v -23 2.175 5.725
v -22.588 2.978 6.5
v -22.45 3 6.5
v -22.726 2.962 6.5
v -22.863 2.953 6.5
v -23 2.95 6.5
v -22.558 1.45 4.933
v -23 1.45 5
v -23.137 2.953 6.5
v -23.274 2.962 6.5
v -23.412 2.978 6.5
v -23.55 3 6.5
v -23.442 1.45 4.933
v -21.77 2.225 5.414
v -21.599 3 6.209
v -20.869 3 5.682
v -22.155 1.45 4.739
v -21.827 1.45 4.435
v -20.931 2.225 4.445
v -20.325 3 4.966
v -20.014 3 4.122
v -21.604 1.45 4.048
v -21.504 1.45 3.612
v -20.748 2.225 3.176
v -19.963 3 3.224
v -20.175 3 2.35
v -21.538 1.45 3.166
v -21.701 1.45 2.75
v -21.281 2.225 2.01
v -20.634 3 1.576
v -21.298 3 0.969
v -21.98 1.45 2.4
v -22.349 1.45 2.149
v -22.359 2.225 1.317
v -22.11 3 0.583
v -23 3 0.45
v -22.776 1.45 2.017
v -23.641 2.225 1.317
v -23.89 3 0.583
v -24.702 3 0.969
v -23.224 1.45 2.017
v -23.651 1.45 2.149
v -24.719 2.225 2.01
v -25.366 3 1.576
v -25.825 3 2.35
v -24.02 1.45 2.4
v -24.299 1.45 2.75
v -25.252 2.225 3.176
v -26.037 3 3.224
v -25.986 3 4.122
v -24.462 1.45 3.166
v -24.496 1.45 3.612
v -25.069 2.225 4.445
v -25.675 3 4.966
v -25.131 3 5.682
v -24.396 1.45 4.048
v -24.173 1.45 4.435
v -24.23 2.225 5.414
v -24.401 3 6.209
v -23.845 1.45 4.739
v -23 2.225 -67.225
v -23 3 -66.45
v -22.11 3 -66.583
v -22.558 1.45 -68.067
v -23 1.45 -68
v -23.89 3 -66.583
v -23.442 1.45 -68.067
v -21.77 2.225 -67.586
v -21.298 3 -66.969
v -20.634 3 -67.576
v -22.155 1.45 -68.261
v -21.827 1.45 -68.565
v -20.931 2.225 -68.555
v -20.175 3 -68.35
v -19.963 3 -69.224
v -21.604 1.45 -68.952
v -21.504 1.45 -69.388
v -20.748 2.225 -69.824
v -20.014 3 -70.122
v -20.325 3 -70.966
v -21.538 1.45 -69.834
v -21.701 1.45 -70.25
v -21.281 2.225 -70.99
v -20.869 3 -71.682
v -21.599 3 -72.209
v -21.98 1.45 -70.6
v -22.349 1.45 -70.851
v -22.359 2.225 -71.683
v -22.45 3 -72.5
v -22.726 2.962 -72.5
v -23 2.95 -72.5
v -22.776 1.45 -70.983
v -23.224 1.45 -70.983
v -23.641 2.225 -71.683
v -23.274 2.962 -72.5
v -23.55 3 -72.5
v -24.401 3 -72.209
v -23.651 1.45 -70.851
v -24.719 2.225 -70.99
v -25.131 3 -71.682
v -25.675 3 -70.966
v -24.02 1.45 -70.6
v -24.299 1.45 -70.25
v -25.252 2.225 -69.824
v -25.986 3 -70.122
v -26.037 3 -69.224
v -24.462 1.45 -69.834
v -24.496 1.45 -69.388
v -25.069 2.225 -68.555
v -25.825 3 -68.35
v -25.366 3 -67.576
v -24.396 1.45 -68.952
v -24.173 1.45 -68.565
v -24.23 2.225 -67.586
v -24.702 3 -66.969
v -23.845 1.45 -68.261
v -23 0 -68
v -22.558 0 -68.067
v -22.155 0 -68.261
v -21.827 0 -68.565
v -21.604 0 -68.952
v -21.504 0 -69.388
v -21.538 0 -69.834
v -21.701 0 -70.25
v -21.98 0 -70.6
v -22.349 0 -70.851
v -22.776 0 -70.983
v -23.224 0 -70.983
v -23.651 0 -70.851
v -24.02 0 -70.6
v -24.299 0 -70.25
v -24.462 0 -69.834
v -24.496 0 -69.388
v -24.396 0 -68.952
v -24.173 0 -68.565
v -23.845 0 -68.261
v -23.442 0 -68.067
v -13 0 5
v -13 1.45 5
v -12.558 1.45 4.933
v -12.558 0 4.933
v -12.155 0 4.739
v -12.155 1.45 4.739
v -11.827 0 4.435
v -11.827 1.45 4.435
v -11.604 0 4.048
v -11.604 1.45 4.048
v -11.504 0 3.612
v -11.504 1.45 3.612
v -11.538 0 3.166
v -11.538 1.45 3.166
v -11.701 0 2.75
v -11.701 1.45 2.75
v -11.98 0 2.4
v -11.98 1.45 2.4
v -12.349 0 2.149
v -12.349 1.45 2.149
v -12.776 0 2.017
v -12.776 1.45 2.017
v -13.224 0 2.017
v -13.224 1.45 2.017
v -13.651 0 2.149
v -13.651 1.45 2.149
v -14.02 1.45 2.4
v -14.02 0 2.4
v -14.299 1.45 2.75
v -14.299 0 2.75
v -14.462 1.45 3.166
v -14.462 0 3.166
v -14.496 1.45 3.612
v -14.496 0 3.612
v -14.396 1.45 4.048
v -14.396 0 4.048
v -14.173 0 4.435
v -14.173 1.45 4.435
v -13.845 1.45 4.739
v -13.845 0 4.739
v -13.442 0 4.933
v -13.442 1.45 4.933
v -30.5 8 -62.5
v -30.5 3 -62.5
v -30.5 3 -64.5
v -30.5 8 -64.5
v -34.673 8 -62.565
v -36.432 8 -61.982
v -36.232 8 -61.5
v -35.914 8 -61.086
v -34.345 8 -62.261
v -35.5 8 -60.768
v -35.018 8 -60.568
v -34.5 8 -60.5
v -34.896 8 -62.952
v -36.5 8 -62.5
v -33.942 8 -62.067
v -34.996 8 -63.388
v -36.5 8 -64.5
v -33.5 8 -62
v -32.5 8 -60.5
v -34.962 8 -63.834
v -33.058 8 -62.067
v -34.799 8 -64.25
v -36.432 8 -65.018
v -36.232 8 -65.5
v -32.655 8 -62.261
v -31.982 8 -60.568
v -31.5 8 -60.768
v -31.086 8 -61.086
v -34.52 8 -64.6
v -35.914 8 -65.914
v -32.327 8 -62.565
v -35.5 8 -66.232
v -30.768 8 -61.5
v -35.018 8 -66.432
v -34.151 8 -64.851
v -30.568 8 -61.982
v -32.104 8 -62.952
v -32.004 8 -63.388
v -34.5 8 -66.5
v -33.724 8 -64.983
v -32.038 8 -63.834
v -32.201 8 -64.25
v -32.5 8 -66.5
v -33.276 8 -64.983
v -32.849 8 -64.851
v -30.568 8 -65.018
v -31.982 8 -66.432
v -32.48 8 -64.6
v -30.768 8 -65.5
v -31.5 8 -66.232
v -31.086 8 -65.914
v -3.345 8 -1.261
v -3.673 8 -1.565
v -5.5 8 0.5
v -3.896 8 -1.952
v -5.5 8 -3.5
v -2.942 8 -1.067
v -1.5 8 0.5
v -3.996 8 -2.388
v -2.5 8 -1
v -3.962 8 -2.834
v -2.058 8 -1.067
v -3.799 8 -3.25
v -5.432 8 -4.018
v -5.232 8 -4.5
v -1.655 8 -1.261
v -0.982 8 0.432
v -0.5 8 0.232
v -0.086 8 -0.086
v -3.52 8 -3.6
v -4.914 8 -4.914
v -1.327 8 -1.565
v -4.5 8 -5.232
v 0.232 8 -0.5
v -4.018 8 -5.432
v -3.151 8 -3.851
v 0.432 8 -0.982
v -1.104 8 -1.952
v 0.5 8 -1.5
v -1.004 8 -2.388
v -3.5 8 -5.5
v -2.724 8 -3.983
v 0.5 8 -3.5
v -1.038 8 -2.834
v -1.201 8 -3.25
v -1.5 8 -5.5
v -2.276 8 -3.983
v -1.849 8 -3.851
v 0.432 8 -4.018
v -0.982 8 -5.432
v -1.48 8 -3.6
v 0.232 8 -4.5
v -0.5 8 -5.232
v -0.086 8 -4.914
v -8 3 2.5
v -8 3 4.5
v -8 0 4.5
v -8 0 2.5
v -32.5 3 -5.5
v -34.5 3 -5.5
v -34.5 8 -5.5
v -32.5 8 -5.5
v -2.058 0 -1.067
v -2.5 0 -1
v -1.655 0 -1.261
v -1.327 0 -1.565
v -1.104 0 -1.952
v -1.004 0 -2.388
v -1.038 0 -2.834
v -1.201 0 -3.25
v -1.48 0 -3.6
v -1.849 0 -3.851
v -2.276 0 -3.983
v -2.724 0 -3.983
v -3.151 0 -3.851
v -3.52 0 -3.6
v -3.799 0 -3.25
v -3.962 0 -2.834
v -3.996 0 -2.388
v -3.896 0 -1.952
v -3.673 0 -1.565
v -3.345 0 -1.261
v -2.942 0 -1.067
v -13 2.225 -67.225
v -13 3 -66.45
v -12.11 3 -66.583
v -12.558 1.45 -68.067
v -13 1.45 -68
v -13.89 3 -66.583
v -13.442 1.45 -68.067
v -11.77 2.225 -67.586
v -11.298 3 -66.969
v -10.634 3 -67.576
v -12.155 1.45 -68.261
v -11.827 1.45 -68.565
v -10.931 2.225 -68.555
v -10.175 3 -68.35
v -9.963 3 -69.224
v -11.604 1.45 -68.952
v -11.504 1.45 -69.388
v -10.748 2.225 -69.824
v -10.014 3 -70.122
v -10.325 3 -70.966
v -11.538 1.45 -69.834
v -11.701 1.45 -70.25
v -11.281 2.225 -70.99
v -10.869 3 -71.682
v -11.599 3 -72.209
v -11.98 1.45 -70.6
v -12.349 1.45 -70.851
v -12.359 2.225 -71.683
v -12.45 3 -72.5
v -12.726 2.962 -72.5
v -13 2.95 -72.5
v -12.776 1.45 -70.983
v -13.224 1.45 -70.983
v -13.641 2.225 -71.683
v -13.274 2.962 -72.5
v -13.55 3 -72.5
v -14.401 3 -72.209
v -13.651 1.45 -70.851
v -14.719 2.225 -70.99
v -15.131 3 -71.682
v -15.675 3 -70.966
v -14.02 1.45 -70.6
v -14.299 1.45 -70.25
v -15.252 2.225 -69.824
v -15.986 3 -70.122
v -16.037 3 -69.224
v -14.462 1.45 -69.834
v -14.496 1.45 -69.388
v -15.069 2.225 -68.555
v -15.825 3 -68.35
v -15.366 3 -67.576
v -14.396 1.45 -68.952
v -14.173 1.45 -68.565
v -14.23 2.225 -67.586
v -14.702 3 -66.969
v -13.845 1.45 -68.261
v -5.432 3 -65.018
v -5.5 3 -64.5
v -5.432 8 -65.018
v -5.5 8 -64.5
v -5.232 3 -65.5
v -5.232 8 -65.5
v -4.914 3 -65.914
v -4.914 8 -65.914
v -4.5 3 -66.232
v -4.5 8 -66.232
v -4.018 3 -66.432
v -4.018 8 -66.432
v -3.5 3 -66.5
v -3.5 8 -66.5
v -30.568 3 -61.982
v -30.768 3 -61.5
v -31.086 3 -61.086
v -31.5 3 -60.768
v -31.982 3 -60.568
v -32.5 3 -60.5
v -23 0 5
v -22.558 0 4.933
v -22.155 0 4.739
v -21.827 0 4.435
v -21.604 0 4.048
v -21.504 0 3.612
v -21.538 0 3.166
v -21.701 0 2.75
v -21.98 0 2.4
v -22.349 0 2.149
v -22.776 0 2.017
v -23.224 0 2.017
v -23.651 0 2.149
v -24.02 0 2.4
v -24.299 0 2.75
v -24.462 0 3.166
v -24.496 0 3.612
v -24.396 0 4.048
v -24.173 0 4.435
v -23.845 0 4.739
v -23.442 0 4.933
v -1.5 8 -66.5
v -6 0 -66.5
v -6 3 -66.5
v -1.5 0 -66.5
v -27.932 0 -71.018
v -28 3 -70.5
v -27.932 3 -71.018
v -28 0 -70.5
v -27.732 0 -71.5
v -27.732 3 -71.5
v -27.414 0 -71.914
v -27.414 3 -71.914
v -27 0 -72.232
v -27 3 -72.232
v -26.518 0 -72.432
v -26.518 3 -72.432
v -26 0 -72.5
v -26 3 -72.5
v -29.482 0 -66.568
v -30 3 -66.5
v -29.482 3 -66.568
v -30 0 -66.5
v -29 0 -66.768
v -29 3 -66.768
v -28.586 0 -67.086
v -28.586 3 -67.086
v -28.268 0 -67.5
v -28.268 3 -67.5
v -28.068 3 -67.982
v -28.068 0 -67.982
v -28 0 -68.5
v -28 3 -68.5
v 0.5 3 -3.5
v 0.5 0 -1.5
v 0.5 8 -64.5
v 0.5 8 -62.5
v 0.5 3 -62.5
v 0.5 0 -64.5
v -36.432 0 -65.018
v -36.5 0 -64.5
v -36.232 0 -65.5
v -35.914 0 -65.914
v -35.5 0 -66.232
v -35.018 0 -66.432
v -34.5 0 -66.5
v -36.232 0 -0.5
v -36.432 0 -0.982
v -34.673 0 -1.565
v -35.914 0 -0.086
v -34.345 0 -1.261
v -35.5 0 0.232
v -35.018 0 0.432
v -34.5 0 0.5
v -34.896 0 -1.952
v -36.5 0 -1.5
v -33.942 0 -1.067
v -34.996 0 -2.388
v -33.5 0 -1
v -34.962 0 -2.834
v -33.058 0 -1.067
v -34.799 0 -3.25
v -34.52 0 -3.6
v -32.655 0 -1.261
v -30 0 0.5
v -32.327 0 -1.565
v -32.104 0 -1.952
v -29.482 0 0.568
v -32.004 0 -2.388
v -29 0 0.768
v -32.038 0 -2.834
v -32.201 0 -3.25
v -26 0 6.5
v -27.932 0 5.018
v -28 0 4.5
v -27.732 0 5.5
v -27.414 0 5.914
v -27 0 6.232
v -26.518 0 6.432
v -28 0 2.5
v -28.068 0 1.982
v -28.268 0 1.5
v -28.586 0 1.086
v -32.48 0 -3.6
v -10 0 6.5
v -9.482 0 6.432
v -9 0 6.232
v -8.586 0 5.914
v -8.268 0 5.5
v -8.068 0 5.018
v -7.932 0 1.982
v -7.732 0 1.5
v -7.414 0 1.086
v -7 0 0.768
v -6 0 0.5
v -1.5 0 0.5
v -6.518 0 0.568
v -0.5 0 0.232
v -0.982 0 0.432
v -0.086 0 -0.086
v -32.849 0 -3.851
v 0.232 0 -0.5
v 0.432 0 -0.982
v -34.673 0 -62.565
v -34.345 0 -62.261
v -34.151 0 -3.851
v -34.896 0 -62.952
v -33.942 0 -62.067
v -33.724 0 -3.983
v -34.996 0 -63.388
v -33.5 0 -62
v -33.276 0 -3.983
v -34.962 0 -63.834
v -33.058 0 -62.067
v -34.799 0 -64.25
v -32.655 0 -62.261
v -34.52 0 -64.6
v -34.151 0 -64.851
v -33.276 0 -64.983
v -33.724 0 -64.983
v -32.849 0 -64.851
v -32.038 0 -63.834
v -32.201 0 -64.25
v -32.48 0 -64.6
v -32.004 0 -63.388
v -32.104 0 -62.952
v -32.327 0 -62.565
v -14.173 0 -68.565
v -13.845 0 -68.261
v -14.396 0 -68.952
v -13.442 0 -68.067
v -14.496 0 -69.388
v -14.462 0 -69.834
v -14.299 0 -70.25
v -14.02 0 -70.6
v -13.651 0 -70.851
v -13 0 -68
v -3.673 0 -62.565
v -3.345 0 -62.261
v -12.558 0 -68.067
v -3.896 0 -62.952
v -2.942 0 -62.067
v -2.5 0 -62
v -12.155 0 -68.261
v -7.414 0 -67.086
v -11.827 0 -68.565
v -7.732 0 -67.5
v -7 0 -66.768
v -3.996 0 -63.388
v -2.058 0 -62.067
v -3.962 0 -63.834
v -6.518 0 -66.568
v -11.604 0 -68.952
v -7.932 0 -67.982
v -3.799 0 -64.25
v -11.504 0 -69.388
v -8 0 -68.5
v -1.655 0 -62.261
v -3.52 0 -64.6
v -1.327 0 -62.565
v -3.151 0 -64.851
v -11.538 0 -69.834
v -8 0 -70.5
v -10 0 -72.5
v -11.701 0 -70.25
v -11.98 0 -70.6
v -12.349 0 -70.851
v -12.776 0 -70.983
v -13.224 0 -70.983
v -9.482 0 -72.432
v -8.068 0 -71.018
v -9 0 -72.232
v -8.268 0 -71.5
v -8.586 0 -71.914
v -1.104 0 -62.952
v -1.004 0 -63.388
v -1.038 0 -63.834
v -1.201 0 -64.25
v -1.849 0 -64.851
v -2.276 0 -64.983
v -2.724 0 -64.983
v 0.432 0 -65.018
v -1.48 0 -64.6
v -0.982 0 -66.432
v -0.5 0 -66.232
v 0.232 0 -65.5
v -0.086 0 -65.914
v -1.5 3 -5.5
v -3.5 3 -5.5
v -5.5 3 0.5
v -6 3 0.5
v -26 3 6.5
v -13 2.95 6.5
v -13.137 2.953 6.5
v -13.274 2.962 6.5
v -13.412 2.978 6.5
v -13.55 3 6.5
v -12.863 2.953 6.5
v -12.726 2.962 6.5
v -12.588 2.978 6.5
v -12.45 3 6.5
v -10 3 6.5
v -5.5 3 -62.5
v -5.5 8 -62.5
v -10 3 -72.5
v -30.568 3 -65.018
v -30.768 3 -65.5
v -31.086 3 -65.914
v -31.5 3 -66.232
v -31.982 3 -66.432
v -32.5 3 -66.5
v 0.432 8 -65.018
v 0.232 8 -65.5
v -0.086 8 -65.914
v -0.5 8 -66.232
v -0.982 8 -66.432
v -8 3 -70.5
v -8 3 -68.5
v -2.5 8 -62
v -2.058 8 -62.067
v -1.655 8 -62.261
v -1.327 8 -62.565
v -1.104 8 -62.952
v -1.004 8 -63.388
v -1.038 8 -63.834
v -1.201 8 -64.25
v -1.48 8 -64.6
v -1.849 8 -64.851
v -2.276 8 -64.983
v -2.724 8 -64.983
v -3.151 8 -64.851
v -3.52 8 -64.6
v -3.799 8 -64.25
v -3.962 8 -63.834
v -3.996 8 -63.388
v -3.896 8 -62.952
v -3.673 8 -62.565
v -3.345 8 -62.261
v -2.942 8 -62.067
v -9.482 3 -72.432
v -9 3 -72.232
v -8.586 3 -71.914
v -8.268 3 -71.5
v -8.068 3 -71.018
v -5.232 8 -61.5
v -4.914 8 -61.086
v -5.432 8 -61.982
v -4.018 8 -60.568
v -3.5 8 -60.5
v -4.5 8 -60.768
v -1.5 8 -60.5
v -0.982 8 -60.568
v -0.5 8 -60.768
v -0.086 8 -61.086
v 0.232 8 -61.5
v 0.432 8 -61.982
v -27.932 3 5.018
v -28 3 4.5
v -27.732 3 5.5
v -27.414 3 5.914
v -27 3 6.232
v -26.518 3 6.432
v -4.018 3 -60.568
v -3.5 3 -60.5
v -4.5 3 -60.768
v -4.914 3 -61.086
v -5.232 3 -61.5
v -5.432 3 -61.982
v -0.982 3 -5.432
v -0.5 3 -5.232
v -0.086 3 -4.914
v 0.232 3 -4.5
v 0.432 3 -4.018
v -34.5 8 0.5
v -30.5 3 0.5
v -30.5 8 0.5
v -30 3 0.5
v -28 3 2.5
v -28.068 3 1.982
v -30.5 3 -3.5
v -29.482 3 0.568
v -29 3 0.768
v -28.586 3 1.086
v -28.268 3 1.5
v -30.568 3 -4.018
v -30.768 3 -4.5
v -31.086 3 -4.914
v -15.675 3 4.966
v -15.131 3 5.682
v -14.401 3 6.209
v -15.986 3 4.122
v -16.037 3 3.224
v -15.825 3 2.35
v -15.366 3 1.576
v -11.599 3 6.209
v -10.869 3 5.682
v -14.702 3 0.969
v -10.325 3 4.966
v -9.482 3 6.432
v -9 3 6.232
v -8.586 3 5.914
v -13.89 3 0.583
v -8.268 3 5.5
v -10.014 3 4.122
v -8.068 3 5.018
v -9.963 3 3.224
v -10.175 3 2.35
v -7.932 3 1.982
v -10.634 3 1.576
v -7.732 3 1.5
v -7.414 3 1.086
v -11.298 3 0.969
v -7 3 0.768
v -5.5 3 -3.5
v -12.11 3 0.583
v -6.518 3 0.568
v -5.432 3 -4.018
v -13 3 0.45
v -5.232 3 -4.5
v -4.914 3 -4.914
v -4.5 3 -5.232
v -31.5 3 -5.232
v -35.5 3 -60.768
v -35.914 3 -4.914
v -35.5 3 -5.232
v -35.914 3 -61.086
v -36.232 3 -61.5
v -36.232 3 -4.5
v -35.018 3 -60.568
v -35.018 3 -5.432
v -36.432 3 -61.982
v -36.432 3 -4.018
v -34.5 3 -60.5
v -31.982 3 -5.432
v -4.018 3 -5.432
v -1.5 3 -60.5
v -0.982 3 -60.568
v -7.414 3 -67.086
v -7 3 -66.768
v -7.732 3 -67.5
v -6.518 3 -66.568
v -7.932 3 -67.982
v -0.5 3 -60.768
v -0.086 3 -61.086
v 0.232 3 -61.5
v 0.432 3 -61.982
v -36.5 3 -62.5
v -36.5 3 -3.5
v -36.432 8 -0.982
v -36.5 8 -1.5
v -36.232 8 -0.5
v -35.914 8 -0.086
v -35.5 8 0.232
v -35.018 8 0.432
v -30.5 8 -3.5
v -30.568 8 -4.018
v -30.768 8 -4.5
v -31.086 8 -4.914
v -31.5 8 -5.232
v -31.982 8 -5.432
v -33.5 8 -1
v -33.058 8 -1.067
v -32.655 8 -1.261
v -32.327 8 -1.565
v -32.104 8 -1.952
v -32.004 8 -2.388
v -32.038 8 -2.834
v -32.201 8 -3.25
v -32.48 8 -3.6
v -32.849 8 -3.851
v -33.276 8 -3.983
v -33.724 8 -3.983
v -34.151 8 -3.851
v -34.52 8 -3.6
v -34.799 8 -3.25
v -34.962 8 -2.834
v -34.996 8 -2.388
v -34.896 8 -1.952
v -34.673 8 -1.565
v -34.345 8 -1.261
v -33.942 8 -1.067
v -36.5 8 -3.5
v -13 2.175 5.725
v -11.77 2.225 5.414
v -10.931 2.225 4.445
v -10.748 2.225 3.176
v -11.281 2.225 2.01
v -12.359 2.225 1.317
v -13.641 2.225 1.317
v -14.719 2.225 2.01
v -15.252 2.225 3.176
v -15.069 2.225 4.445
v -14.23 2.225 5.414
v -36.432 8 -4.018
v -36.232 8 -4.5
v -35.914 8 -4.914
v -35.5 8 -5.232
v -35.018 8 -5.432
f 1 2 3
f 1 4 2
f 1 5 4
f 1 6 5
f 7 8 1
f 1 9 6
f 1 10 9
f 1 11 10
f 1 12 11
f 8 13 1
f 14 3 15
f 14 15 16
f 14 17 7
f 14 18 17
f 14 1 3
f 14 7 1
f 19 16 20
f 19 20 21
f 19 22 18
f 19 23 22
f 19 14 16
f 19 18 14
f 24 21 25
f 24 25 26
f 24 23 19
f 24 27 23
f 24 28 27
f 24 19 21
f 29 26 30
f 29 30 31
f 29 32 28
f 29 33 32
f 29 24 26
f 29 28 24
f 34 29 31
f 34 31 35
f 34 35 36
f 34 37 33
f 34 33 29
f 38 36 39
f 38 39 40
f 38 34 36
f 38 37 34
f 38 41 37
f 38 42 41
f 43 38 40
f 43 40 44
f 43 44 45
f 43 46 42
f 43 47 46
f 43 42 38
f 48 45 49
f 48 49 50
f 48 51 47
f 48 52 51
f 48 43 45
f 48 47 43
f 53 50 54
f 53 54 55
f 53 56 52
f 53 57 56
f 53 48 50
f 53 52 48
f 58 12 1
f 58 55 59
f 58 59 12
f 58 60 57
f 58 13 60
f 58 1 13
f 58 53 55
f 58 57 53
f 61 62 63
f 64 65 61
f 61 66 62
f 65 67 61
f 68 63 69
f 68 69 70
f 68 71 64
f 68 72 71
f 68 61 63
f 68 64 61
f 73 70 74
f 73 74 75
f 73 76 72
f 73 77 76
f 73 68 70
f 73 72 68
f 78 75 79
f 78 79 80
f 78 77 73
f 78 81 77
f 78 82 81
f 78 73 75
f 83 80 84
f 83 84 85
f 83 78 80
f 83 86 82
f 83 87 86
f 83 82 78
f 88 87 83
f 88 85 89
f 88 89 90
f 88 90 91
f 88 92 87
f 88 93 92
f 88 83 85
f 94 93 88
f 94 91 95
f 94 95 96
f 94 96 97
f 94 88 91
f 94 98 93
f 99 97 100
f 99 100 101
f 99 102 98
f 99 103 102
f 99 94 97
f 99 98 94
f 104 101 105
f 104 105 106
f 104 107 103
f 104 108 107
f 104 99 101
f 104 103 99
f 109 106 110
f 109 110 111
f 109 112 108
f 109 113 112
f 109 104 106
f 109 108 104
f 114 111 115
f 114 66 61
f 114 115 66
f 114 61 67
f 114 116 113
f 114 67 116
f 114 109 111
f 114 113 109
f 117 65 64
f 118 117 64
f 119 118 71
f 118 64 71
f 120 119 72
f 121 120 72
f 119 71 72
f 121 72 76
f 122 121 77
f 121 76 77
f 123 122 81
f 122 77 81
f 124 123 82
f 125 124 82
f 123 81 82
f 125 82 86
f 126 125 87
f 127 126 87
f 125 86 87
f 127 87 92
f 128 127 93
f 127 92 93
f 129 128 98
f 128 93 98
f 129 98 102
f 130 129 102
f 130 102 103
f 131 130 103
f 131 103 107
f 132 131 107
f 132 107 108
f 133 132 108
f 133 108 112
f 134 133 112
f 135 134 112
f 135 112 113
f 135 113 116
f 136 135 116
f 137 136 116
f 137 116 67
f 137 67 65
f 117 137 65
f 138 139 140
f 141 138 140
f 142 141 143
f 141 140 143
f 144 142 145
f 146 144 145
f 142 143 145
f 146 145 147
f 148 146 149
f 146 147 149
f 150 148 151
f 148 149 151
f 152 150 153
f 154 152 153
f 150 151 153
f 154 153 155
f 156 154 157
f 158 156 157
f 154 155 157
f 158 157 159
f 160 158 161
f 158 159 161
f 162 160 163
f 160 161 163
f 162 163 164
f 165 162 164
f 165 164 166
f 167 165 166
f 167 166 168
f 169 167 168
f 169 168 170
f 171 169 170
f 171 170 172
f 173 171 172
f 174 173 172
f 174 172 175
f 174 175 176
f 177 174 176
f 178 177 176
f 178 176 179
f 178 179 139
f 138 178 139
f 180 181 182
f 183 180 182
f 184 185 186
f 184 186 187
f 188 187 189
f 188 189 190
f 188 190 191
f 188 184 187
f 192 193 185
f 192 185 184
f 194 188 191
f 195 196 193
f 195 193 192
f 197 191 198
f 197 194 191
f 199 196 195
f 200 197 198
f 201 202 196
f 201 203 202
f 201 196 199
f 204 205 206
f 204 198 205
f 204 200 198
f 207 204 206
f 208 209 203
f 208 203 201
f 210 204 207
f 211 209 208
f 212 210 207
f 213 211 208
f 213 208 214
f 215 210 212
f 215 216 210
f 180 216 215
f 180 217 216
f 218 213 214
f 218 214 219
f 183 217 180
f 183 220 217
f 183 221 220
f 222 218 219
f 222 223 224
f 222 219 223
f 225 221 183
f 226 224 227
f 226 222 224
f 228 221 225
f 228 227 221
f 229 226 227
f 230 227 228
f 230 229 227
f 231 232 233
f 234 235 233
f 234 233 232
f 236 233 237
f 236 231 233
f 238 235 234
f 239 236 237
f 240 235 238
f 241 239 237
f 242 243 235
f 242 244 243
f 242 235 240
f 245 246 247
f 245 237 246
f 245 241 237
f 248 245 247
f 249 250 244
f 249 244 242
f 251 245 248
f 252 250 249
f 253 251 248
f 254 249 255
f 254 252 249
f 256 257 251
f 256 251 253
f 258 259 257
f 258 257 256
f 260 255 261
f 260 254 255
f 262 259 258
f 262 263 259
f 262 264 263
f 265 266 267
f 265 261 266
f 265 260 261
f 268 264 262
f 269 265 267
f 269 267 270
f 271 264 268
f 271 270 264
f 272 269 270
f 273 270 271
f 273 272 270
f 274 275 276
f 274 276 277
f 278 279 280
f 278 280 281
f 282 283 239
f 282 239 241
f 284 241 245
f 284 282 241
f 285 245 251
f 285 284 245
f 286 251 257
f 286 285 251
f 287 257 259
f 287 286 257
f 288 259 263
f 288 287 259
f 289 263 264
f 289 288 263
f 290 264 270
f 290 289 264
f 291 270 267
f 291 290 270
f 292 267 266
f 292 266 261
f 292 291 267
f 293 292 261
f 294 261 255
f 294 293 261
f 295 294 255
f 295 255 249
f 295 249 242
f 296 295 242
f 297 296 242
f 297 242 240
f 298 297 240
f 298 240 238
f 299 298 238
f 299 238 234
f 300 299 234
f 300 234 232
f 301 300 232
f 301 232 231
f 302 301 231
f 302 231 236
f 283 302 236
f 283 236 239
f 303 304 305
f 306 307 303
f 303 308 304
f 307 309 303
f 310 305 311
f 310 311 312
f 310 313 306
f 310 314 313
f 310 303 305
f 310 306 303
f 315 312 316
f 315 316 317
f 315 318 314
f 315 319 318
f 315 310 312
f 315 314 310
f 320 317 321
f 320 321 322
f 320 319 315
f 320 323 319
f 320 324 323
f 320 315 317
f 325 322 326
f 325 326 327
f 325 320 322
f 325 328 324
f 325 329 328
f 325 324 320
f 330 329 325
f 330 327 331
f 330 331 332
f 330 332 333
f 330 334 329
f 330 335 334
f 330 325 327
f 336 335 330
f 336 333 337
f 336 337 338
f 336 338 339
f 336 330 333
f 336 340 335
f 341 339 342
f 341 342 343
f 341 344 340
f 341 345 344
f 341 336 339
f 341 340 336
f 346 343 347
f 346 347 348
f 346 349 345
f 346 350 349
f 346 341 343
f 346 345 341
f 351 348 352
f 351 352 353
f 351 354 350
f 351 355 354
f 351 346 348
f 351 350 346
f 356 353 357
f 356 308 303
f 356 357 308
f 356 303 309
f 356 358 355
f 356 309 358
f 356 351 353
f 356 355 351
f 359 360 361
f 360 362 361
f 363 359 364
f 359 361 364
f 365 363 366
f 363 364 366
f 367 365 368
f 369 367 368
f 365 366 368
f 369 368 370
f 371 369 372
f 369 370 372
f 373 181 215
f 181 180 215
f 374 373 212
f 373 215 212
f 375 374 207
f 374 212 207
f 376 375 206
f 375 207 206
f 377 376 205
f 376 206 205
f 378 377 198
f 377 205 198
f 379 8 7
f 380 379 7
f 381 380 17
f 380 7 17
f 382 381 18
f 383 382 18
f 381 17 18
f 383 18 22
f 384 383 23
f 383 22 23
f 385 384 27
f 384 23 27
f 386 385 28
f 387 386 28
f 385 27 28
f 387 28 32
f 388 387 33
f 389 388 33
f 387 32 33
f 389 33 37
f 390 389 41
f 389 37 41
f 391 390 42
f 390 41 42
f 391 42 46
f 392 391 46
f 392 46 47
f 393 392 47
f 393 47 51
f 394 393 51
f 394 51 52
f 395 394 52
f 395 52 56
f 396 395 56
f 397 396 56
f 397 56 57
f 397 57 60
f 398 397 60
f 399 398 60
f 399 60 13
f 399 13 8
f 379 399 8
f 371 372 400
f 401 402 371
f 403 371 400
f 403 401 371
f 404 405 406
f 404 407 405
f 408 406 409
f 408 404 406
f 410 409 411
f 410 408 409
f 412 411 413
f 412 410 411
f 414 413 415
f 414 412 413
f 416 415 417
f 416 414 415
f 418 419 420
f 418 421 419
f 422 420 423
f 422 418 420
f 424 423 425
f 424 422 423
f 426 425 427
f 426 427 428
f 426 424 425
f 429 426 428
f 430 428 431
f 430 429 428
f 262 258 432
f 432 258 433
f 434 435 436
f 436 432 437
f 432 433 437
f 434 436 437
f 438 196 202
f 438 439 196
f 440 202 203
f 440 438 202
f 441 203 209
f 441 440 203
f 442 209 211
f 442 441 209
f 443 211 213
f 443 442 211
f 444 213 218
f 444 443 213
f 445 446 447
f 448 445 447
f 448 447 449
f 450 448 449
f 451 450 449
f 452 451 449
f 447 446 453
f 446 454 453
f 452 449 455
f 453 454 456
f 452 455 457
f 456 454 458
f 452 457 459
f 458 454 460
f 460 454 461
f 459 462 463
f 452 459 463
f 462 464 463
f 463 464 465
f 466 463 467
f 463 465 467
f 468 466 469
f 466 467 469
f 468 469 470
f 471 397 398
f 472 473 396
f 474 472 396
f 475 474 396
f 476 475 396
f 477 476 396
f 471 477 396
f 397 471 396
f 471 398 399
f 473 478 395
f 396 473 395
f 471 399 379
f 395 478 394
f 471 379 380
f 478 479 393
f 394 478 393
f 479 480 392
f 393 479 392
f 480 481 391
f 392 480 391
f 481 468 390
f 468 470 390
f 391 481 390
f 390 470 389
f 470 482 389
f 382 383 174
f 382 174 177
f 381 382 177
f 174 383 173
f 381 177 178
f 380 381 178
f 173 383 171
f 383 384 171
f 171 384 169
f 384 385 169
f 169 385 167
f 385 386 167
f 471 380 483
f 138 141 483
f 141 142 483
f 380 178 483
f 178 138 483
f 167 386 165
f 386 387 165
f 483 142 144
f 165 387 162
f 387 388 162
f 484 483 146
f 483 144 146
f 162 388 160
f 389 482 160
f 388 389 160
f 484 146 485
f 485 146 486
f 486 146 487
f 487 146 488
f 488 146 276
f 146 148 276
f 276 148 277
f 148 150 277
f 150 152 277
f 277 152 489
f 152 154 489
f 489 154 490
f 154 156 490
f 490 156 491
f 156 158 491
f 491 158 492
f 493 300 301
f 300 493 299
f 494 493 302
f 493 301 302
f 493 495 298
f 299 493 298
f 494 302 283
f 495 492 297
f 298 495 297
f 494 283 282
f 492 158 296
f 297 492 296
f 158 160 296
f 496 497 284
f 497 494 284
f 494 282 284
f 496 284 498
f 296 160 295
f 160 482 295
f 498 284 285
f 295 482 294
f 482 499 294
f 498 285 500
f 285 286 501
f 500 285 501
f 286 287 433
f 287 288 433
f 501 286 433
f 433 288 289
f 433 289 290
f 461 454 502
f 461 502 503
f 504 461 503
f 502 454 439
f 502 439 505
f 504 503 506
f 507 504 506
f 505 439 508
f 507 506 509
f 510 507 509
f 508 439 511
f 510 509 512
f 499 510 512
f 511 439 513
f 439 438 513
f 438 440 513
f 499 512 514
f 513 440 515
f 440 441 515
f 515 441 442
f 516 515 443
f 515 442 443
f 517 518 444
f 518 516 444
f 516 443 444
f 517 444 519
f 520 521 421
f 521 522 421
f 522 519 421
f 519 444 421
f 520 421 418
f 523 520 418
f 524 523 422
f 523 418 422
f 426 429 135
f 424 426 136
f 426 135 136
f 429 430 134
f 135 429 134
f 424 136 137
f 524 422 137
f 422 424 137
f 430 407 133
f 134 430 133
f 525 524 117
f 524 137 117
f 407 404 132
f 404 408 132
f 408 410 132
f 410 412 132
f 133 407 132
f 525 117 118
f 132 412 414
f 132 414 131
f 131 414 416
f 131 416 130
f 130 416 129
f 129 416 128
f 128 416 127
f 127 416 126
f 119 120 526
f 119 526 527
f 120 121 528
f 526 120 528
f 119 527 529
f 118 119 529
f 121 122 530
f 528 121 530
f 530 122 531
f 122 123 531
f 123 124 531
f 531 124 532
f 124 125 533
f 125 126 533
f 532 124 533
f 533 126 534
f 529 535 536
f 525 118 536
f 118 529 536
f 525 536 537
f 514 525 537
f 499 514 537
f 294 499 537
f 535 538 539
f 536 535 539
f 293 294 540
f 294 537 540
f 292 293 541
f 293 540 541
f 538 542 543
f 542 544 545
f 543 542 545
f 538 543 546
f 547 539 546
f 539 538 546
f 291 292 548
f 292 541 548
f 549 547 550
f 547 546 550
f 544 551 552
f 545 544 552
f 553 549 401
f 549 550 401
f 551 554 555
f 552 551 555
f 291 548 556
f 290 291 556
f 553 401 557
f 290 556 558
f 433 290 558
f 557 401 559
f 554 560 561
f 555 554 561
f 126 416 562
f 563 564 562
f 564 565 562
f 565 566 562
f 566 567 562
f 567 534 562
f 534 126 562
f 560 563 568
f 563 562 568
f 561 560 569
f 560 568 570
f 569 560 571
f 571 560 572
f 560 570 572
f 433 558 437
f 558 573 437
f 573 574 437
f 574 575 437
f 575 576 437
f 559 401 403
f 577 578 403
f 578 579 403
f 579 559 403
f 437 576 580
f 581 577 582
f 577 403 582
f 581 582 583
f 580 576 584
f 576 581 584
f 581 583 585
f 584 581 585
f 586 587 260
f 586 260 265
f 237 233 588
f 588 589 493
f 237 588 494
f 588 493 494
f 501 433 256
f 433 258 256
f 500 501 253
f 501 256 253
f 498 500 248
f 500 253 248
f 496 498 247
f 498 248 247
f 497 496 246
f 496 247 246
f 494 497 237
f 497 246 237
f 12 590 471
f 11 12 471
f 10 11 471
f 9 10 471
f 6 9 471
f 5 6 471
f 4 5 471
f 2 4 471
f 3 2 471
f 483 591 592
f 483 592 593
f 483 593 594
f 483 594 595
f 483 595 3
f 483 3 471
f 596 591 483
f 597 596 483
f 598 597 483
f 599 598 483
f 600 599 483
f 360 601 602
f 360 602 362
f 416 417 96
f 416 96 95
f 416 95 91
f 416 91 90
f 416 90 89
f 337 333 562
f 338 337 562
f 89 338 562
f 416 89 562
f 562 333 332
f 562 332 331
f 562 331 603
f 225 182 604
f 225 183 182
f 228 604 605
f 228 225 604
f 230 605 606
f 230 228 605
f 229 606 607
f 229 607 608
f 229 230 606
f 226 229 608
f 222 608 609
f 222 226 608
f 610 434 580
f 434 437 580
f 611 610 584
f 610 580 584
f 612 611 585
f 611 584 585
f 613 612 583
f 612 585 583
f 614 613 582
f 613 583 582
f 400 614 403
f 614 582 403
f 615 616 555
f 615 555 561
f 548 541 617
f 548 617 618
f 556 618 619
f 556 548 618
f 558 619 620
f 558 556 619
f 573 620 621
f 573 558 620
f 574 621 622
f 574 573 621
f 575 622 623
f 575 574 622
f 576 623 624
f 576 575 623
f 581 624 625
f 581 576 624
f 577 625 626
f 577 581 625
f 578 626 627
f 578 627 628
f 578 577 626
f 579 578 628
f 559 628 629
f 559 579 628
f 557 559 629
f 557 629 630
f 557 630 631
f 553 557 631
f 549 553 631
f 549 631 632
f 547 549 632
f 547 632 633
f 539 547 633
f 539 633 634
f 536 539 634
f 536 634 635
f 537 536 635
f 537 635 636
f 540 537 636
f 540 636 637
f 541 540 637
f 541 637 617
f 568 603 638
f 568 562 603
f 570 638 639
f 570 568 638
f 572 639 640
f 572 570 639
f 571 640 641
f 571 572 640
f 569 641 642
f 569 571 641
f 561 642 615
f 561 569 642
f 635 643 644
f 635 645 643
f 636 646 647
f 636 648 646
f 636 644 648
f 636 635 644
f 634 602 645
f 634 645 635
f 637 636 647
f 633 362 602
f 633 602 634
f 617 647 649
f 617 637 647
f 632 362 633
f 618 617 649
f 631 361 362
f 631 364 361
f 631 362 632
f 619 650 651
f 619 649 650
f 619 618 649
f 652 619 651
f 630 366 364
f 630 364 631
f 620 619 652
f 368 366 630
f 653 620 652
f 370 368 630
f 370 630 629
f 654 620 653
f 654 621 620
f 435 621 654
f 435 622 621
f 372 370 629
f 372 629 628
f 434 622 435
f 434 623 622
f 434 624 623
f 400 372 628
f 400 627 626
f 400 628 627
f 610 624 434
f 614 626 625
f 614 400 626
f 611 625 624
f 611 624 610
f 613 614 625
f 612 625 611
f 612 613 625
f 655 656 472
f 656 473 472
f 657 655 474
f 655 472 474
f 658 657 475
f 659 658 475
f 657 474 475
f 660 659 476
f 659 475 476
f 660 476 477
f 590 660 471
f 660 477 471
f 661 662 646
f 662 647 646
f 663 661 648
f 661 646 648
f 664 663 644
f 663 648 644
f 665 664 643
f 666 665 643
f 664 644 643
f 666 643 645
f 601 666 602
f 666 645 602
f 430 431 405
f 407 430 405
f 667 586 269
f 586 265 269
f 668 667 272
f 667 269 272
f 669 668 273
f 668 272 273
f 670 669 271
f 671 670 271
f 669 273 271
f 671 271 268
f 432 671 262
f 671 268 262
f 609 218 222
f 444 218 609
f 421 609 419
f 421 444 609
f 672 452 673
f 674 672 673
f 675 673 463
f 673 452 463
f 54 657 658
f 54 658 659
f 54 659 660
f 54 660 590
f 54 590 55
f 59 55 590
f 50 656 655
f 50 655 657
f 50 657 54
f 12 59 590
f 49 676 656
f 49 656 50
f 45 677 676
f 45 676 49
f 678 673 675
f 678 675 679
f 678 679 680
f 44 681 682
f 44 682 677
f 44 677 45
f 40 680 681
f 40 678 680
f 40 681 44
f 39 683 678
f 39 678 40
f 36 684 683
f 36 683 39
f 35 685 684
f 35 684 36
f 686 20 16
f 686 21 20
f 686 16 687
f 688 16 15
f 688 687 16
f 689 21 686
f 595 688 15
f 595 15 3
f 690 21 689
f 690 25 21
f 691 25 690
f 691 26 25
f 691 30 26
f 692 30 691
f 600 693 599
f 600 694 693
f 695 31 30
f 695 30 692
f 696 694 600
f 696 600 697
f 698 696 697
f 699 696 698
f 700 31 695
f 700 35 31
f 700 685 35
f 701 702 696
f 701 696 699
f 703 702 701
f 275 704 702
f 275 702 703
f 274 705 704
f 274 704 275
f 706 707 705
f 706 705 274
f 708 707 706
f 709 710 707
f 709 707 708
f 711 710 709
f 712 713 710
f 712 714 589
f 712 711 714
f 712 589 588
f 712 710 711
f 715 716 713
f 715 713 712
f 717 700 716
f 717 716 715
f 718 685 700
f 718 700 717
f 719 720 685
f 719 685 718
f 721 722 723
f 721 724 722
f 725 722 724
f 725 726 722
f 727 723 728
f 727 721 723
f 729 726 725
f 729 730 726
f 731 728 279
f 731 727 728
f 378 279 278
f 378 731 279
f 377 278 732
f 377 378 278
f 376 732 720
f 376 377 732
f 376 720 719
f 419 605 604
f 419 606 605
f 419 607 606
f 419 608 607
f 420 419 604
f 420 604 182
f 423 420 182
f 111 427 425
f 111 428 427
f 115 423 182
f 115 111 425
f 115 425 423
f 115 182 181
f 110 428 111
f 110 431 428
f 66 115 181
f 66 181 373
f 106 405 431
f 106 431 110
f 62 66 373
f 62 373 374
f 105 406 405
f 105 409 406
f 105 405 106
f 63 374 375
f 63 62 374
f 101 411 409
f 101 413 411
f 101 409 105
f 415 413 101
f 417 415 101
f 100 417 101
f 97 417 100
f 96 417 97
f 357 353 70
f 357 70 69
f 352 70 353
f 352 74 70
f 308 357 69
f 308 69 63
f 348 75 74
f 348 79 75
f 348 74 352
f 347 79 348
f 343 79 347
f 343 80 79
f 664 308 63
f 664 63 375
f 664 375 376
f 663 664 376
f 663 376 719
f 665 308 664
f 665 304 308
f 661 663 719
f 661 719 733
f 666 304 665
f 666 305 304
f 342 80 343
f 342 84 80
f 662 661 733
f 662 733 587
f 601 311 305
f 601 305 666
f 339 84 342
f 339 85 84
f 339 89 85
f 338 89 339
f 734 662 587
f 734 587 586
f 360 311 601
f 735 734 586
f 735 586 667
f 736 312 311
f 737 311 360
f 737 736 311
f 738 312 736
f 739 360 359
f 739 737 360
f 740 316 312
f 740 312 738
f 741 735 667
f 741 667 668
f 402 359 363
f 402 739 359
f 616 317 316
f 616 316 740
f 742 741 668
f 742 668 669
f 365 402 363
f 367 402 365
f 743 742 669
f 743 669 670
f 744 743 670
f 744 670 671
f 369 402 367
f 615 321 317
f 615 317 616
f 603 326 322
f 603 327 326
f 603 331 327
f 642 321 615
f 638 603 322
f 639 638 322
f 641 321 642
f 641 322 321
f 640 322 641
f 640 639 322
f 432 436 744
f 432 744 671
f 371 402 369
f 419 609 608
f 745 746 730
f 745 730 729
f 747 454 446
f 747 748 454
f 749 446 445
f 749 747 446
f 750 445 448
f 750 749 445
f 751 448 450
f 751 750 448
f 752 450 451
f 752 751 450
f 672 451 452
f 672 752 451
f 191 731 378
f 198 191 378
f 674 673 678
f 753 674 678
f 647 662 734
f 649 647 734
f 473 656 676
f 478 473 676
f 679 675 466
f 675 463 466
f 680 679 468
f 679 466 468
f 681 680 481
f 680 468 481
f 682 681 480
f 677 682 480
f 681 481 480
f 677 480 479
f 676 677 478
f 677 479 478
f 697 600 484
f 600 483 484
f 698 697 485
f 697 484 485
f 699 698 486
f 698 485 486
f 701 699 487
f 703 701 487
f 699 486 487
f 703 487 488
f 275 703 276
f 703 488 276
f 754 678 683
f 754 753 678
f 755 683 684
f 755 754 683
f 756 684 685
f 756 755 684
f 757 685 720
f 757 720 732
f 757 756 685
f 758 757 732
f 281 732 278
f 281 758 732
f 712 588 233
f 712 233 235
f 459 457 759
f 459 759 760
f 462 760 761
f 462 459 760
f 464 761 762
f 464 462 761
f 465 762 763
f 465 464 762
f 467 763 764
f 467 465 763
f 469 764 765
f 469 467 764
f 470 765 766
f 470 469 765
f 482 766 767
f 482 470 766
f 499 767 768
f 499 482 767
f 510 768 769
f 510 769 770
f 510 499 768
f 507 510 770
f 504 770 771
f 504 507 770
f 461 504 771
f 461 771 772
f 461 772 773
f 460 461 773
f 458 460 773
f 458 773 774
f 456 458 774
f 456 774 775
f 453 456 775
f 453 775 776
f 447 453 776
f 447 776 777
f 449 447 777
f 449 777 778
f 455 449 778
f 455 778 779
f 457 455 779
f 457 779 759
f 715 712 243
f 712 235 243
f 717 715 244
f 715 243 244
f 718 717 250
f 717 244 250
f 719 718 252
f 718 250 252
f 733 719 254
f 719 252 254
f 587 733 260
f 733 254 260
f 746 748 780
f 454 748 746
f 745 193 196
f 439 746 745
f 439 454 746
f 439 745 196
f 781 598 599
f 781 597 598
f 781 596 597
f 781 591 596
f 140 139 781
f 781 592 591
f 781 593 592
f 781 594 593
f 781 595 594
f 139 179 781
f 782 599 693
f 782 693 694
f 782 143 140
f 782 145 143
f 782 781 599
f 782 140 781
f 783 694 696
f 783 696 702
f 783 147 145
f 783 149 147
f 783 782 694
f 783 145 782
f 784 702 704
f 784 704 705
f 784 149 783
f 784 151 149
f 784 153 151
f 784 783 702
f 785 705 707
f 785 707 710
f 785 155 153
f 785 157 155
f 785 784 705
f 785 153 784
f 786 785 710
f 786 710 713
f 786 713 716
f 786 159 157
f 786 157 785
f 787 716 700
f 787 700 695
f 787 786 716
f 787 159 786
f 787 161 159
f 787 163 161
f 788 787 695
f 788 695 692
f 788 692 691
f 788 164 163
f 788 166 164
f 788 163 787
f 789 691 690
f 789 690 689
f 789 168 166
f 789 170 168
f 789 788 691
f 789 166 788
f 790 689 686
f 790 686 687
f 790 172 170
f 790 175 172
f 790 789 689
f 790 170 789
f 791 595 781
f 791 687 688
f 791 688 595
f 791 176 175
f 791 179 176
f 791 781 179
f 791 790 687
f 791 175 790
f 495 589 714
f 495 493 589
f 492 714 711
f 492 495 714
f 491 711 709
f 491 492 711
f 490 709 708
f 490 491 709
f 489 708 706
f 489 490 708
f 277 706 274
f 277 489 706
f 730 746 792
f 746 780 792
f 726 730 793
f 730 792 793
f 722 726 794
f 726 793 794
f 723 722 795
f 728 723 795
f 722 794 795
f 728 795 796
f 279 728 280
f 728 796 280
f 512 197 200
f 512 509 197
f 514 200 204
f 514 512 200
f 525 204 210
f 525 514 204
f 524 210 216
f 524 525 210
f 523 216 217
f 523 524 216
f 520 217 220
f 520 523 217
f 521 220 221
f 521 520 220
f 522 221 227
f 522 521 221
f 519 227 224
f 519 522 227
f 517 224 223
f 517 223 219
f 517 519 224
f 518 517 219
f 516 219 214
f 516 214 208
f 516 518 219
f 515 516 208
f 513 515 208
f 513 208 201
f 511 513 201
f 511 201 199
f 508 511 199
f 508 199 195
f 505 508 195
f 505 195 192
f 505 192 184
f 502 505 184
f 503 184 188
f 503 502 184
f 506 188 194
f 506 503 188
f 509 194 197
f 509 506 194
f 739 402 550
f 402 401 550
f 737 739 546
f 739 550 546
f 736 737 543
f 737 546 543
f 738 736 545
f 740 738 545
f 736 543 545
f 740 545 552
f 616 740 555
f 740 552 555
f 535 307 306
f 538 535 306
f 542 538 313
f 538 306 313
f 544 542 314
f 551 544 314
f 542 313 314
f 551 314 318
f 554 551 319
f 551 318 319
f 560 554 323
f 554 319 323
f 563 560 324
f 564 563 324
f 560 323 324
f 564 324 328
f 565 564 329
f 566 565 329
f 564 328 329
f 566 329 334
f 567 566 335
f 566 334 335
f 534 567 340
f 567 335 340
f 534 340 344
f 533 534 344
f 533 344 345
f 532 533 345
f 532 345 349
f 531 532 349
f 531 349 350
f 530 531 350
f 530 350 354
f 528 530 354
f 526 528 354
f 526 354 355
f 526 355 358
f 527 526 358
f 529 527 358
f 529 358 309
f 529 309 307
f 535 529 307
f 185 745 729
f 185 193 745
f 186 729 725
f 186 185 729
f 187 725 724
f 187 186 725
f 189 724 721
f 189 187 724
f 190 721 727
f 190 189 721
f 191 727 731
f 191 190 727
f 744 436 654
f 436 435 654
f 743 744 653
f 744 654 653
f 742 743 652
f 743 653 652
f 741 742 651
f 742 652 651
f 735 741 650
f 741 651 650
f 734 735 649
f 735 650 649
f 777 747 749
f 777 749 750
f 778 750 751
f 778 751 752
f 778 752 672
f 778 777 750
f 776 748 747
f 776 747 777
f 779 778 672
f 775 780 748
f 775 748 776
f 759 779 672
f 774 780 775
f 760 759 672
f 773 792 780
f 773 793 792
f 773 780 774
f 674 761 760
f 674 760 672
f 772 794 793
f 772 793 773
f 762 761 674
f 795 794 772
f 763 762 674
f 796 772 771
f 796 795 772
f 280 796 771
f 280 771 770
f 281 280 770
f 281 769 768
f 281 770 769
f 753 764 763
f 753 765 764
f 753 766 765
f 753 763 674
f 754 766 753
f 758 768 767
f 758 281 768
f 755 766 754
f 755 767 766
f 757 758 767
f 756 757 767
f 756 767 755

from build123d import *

# Parameters (mm, degrees)
SKETCH1_W           = 37
SKETCH1_H           = 67
SKETCH1_R           = 1.5
BOSS_EXTRUDE1_DEPTH = 3
SKETCH2_W           = 6
SKETCH2_H           = 6
SKETCH2_R           = 1.5
BOSS_EXTRUDE2_DEPTH = 5
FILLET1_R           = 2
SKETCH3_W           = 20
SKETCH3_H           = 6
SKETCH3_R           = 1.5
BOSS_EXTRUDE3_DEPTH = 3
FILLET2_R           = 2
CHAMFER1_SIZE       = 1.55


with BuildPart() as part:
    # Sketch1 → Boss-Extrude1 (new body)
    with BuildSketch(Plane(origin=(0, 0, 0), x_dir=(1, 0, 0), z_dir=(0, 1, 0))):
        with Locations((-18, 33)):
            Rectangle(SKETCH1_W, SKETCH1_H)
        with Locations(Location((-2.5, 63.5, 0), (0, 0, 270))):
            Circle(SKETCH1_R, mode=Mode.SUBTRACT)
        with Locations(Location((-33.5, 63.5, 0), (0, 0, 270))):
            Circle(SKETCH1_R, mode=Mode.SUBTRACT)
        with Locations(Location((-2.5, 2.5, 0), (0, 0, 270))):
            Circle(SKETCH1_R, mode=Mode.SUBTRACT)
        with Locations(Location((-33.5, 2.5, 0), (0, 0, 270))):
            Circle(SKETCH1_R, mode=Mode.SUBTRACT)
    extrude(amount=BOSS_EXTRUDE1_DEPTH)

    # Sketch2 → Boss-Extrude2 (add)
    # profile 1 of 4: a face of its own
    with BuildSketch(Plane(origin=(0, 3, 0), x_dir=(1, 0, 0), z_dir=(0, 1, 0))):
        with Locations((-33.5, 63.5)):
            Rectangle(SKETCH2_W, SKETCH2_H)
        with Locations(Location((-33.5, 63.5, 0), (0, 0, 270))):
            Circle(SKETCH2_R, mode=Mode.SUBTRACT)
    # profile 2 of 4: a face of its own
    with BuildSketch(Plane(origin=(0, 3, 0), x_dir=(1, 0, 0), z_dir=(0, 1, 0))):
        with Locations((-2.5, 63.5)):
            Rectangle(SKETCH2_W, SKETCH2_H)
        with Locations(Location((-2.5, 63.5, 0), (0, 0, 270))):
            Circle(SKETCH2_R, mode=Mode.SUBTRACT)
    # profile 3 of 4: a face of its own
    with BuildSketch(Plane(origin=(0, 3, 0), x_dir=(1, 0, 0), z_dir=(0, 1, 0))):
        with Locations((-2.5, 2.5)):
            Rectangle(SKETCH2_W, SKETCH2_H)
        with Locations(Location((-2.5, 2.5, 0), (0, 0, 270))):
            Circle(SKETCH2_R, mode=Mode.SUBTRACT)
    # profile 4 of 4: a face of its own
    with BuildSketch(Plane(origin=(0, 3, 0), x_dir=(1, 0, 0), z_dir=(0, 1, 0))):
        with Locations((-33.5, 2.5)):
            Rectangle(SKETCH2_W, SKETCH2_H)
        with Locations(Location((-33.5, 2.5, 0), (0, 0, 270))):
            Circle(SKETCH2_R, mode=Mode.SUBTRACT)
    extrude(amount=BOSS_EXTRUDE2_DEPTH)

    # Fillet1
    fillet1_edges = [part.edges().sort_by_distance(p)[0] for p in [
        (0.5, 4, 0.5),
        (-36.5, 4, 0.5),
        (-36.5, 4, -66.5),
        (0.5, 4, -66.5),
        (-36.5, 5.5, -60.5),
        (-30.5, 5.5, -60.5),
        (-30.5, 5.5, -66.5),
        (0.5, 5.5, -60.5),
        (-5.5, 5.5, -66.5),
        (-5.5, 5.5, -60.5),
        (0.5, 5.5, -5.5),
        (-5.5, 5.5, -5.5),
        (-36.5, 5.5, -5.5),
        (-30.5, 5.5, -5.5),
    ]]
    fillet(fillet1_edges, radius=FILLET1_R)

    # Sketch3 → Boss-Extrude3 (add)
    # profile 1 of 2: a face of its own
    with BuildSketch(Plane(origin=(0, 3, 0), x_dir=(1, 0, 0), z_dir=(0, 1, 0))):
        with Locations((-18, 69.5)):
            Rectangle(SKETCH3_W, SKETCH3_H)
        with Locations(Location((-13, 69.5, 0), (0, 0, 270))):
            Circle(SKETCH3_R, mode=Mode.SUBTRACT)
        with Locations(Location((-23, 69.5, 0), (0, 0, 270))):
            Circle(SKETCH3_R, mode=Mode.SUBTRACT)
    # profile 2 of 2: a face of its own
    with BuildSketch(Plane(origin=(0, 3, 0), x_dir=(1, 0, 0), z_dir=(0, 1, 0))):
        with Locations((-18, -3.5)):
            Rectangle(SKETCH3_W, SKETCH3_H)
        with Locations(Location((-23, -3.5, 0), (0, 0, 270))):
            Circle(SKETCH3_R, mode=Mode.SUBTRACT)
        with Locations(Location((-13, -3.5, 0), (0, 0, 270))):
            Circle(SKETCH3_R, mode=Mode.SUBTRACT)
    extrude(amount=-BOSS_EXTRUDE3_DEPTH)

    # Fillet2
    fillet2_edges = [part.edges().sort_by_distance(p)[0] for p in [
        (-28, 1.5, 0.5),
        (-8, 1.5, 0.5),
        (-8, 1.5, 6.5),
        (-28, 1.5, 6.5),
        (-28, 1.5, -66.5),
        (-8, 1.5, -66.5),
        (-8, 1.5, -72.5),
        (-28, 1.5, -72.5),
    ]]
    fillet(fillet2_edges, radius=FILLET2_R)

    # Chamfer1
    # the kernel refuses this chamfer: 1.55 mm, written as the material it takes off along each edge
    with BuildSketch(Plane(origin=(-23, 3, 3.5), x_dir=(0, 0, 1), z_dir=(-1, 0, 0))) as chamfer1_piece_1:
        Polygon((1.5 + CHAMFER1_SIZE, 0), (1.5, -CHAMFER1_SIZE), (1.5, 0), align=None)
    revolve(axis=Axis((-23, 3, 3.5), (0, 1, 0)), mode=Mode.SUBTRACT)
    with BuildSketch(Plane(origin=(-13, 3, 3.5), x_dir=(0, 0, 1), z_dir=(-1, 0, 0))) as chamfer1_piece_2:
        Polygon((1.5 + CHAMFER1_SIZE, 0), (1.5, -CHAMFER1_SIZE), (1.5, 0), align=None)
    revolve(axis=Axis((-13, 3, 3.5), (0, 1, 0)), mode=Mode.SUBTRACT)
    with BuildSketch(Plane(origin=(-23, 3, -69.5), x_dir=(0, 0, 1), z_dir=(-1, 0, 0))) as chamfer1_piece_3:
        Polygon((1.5 + CHAMFER1_SIZE, 0), (1.5, -CHAMFER1_SIZE), (1.5, 0), align=None)
    revolve(axis=Axis((-23, 3, -69.5), (0, 1, 0)), mode=Mode.SUBTRACT)
    with BuildSketch(Plane(origin=(-13, 3, -69.5), x_dir=(0, 0, 1), z_dir=(-1, 0, 0))) as chamfer1_piece_4:
        Polygon((1.5 + CHAMFER1_SIZE, 0), (1.5, -CHAMFER1_SIZE), (1.5, 0), align=None)
    revolve(axis=Axis((-13, 3, -69.5), (0, 1, 0)), mode=Mode.SUBTRACT)


solid = part.part
